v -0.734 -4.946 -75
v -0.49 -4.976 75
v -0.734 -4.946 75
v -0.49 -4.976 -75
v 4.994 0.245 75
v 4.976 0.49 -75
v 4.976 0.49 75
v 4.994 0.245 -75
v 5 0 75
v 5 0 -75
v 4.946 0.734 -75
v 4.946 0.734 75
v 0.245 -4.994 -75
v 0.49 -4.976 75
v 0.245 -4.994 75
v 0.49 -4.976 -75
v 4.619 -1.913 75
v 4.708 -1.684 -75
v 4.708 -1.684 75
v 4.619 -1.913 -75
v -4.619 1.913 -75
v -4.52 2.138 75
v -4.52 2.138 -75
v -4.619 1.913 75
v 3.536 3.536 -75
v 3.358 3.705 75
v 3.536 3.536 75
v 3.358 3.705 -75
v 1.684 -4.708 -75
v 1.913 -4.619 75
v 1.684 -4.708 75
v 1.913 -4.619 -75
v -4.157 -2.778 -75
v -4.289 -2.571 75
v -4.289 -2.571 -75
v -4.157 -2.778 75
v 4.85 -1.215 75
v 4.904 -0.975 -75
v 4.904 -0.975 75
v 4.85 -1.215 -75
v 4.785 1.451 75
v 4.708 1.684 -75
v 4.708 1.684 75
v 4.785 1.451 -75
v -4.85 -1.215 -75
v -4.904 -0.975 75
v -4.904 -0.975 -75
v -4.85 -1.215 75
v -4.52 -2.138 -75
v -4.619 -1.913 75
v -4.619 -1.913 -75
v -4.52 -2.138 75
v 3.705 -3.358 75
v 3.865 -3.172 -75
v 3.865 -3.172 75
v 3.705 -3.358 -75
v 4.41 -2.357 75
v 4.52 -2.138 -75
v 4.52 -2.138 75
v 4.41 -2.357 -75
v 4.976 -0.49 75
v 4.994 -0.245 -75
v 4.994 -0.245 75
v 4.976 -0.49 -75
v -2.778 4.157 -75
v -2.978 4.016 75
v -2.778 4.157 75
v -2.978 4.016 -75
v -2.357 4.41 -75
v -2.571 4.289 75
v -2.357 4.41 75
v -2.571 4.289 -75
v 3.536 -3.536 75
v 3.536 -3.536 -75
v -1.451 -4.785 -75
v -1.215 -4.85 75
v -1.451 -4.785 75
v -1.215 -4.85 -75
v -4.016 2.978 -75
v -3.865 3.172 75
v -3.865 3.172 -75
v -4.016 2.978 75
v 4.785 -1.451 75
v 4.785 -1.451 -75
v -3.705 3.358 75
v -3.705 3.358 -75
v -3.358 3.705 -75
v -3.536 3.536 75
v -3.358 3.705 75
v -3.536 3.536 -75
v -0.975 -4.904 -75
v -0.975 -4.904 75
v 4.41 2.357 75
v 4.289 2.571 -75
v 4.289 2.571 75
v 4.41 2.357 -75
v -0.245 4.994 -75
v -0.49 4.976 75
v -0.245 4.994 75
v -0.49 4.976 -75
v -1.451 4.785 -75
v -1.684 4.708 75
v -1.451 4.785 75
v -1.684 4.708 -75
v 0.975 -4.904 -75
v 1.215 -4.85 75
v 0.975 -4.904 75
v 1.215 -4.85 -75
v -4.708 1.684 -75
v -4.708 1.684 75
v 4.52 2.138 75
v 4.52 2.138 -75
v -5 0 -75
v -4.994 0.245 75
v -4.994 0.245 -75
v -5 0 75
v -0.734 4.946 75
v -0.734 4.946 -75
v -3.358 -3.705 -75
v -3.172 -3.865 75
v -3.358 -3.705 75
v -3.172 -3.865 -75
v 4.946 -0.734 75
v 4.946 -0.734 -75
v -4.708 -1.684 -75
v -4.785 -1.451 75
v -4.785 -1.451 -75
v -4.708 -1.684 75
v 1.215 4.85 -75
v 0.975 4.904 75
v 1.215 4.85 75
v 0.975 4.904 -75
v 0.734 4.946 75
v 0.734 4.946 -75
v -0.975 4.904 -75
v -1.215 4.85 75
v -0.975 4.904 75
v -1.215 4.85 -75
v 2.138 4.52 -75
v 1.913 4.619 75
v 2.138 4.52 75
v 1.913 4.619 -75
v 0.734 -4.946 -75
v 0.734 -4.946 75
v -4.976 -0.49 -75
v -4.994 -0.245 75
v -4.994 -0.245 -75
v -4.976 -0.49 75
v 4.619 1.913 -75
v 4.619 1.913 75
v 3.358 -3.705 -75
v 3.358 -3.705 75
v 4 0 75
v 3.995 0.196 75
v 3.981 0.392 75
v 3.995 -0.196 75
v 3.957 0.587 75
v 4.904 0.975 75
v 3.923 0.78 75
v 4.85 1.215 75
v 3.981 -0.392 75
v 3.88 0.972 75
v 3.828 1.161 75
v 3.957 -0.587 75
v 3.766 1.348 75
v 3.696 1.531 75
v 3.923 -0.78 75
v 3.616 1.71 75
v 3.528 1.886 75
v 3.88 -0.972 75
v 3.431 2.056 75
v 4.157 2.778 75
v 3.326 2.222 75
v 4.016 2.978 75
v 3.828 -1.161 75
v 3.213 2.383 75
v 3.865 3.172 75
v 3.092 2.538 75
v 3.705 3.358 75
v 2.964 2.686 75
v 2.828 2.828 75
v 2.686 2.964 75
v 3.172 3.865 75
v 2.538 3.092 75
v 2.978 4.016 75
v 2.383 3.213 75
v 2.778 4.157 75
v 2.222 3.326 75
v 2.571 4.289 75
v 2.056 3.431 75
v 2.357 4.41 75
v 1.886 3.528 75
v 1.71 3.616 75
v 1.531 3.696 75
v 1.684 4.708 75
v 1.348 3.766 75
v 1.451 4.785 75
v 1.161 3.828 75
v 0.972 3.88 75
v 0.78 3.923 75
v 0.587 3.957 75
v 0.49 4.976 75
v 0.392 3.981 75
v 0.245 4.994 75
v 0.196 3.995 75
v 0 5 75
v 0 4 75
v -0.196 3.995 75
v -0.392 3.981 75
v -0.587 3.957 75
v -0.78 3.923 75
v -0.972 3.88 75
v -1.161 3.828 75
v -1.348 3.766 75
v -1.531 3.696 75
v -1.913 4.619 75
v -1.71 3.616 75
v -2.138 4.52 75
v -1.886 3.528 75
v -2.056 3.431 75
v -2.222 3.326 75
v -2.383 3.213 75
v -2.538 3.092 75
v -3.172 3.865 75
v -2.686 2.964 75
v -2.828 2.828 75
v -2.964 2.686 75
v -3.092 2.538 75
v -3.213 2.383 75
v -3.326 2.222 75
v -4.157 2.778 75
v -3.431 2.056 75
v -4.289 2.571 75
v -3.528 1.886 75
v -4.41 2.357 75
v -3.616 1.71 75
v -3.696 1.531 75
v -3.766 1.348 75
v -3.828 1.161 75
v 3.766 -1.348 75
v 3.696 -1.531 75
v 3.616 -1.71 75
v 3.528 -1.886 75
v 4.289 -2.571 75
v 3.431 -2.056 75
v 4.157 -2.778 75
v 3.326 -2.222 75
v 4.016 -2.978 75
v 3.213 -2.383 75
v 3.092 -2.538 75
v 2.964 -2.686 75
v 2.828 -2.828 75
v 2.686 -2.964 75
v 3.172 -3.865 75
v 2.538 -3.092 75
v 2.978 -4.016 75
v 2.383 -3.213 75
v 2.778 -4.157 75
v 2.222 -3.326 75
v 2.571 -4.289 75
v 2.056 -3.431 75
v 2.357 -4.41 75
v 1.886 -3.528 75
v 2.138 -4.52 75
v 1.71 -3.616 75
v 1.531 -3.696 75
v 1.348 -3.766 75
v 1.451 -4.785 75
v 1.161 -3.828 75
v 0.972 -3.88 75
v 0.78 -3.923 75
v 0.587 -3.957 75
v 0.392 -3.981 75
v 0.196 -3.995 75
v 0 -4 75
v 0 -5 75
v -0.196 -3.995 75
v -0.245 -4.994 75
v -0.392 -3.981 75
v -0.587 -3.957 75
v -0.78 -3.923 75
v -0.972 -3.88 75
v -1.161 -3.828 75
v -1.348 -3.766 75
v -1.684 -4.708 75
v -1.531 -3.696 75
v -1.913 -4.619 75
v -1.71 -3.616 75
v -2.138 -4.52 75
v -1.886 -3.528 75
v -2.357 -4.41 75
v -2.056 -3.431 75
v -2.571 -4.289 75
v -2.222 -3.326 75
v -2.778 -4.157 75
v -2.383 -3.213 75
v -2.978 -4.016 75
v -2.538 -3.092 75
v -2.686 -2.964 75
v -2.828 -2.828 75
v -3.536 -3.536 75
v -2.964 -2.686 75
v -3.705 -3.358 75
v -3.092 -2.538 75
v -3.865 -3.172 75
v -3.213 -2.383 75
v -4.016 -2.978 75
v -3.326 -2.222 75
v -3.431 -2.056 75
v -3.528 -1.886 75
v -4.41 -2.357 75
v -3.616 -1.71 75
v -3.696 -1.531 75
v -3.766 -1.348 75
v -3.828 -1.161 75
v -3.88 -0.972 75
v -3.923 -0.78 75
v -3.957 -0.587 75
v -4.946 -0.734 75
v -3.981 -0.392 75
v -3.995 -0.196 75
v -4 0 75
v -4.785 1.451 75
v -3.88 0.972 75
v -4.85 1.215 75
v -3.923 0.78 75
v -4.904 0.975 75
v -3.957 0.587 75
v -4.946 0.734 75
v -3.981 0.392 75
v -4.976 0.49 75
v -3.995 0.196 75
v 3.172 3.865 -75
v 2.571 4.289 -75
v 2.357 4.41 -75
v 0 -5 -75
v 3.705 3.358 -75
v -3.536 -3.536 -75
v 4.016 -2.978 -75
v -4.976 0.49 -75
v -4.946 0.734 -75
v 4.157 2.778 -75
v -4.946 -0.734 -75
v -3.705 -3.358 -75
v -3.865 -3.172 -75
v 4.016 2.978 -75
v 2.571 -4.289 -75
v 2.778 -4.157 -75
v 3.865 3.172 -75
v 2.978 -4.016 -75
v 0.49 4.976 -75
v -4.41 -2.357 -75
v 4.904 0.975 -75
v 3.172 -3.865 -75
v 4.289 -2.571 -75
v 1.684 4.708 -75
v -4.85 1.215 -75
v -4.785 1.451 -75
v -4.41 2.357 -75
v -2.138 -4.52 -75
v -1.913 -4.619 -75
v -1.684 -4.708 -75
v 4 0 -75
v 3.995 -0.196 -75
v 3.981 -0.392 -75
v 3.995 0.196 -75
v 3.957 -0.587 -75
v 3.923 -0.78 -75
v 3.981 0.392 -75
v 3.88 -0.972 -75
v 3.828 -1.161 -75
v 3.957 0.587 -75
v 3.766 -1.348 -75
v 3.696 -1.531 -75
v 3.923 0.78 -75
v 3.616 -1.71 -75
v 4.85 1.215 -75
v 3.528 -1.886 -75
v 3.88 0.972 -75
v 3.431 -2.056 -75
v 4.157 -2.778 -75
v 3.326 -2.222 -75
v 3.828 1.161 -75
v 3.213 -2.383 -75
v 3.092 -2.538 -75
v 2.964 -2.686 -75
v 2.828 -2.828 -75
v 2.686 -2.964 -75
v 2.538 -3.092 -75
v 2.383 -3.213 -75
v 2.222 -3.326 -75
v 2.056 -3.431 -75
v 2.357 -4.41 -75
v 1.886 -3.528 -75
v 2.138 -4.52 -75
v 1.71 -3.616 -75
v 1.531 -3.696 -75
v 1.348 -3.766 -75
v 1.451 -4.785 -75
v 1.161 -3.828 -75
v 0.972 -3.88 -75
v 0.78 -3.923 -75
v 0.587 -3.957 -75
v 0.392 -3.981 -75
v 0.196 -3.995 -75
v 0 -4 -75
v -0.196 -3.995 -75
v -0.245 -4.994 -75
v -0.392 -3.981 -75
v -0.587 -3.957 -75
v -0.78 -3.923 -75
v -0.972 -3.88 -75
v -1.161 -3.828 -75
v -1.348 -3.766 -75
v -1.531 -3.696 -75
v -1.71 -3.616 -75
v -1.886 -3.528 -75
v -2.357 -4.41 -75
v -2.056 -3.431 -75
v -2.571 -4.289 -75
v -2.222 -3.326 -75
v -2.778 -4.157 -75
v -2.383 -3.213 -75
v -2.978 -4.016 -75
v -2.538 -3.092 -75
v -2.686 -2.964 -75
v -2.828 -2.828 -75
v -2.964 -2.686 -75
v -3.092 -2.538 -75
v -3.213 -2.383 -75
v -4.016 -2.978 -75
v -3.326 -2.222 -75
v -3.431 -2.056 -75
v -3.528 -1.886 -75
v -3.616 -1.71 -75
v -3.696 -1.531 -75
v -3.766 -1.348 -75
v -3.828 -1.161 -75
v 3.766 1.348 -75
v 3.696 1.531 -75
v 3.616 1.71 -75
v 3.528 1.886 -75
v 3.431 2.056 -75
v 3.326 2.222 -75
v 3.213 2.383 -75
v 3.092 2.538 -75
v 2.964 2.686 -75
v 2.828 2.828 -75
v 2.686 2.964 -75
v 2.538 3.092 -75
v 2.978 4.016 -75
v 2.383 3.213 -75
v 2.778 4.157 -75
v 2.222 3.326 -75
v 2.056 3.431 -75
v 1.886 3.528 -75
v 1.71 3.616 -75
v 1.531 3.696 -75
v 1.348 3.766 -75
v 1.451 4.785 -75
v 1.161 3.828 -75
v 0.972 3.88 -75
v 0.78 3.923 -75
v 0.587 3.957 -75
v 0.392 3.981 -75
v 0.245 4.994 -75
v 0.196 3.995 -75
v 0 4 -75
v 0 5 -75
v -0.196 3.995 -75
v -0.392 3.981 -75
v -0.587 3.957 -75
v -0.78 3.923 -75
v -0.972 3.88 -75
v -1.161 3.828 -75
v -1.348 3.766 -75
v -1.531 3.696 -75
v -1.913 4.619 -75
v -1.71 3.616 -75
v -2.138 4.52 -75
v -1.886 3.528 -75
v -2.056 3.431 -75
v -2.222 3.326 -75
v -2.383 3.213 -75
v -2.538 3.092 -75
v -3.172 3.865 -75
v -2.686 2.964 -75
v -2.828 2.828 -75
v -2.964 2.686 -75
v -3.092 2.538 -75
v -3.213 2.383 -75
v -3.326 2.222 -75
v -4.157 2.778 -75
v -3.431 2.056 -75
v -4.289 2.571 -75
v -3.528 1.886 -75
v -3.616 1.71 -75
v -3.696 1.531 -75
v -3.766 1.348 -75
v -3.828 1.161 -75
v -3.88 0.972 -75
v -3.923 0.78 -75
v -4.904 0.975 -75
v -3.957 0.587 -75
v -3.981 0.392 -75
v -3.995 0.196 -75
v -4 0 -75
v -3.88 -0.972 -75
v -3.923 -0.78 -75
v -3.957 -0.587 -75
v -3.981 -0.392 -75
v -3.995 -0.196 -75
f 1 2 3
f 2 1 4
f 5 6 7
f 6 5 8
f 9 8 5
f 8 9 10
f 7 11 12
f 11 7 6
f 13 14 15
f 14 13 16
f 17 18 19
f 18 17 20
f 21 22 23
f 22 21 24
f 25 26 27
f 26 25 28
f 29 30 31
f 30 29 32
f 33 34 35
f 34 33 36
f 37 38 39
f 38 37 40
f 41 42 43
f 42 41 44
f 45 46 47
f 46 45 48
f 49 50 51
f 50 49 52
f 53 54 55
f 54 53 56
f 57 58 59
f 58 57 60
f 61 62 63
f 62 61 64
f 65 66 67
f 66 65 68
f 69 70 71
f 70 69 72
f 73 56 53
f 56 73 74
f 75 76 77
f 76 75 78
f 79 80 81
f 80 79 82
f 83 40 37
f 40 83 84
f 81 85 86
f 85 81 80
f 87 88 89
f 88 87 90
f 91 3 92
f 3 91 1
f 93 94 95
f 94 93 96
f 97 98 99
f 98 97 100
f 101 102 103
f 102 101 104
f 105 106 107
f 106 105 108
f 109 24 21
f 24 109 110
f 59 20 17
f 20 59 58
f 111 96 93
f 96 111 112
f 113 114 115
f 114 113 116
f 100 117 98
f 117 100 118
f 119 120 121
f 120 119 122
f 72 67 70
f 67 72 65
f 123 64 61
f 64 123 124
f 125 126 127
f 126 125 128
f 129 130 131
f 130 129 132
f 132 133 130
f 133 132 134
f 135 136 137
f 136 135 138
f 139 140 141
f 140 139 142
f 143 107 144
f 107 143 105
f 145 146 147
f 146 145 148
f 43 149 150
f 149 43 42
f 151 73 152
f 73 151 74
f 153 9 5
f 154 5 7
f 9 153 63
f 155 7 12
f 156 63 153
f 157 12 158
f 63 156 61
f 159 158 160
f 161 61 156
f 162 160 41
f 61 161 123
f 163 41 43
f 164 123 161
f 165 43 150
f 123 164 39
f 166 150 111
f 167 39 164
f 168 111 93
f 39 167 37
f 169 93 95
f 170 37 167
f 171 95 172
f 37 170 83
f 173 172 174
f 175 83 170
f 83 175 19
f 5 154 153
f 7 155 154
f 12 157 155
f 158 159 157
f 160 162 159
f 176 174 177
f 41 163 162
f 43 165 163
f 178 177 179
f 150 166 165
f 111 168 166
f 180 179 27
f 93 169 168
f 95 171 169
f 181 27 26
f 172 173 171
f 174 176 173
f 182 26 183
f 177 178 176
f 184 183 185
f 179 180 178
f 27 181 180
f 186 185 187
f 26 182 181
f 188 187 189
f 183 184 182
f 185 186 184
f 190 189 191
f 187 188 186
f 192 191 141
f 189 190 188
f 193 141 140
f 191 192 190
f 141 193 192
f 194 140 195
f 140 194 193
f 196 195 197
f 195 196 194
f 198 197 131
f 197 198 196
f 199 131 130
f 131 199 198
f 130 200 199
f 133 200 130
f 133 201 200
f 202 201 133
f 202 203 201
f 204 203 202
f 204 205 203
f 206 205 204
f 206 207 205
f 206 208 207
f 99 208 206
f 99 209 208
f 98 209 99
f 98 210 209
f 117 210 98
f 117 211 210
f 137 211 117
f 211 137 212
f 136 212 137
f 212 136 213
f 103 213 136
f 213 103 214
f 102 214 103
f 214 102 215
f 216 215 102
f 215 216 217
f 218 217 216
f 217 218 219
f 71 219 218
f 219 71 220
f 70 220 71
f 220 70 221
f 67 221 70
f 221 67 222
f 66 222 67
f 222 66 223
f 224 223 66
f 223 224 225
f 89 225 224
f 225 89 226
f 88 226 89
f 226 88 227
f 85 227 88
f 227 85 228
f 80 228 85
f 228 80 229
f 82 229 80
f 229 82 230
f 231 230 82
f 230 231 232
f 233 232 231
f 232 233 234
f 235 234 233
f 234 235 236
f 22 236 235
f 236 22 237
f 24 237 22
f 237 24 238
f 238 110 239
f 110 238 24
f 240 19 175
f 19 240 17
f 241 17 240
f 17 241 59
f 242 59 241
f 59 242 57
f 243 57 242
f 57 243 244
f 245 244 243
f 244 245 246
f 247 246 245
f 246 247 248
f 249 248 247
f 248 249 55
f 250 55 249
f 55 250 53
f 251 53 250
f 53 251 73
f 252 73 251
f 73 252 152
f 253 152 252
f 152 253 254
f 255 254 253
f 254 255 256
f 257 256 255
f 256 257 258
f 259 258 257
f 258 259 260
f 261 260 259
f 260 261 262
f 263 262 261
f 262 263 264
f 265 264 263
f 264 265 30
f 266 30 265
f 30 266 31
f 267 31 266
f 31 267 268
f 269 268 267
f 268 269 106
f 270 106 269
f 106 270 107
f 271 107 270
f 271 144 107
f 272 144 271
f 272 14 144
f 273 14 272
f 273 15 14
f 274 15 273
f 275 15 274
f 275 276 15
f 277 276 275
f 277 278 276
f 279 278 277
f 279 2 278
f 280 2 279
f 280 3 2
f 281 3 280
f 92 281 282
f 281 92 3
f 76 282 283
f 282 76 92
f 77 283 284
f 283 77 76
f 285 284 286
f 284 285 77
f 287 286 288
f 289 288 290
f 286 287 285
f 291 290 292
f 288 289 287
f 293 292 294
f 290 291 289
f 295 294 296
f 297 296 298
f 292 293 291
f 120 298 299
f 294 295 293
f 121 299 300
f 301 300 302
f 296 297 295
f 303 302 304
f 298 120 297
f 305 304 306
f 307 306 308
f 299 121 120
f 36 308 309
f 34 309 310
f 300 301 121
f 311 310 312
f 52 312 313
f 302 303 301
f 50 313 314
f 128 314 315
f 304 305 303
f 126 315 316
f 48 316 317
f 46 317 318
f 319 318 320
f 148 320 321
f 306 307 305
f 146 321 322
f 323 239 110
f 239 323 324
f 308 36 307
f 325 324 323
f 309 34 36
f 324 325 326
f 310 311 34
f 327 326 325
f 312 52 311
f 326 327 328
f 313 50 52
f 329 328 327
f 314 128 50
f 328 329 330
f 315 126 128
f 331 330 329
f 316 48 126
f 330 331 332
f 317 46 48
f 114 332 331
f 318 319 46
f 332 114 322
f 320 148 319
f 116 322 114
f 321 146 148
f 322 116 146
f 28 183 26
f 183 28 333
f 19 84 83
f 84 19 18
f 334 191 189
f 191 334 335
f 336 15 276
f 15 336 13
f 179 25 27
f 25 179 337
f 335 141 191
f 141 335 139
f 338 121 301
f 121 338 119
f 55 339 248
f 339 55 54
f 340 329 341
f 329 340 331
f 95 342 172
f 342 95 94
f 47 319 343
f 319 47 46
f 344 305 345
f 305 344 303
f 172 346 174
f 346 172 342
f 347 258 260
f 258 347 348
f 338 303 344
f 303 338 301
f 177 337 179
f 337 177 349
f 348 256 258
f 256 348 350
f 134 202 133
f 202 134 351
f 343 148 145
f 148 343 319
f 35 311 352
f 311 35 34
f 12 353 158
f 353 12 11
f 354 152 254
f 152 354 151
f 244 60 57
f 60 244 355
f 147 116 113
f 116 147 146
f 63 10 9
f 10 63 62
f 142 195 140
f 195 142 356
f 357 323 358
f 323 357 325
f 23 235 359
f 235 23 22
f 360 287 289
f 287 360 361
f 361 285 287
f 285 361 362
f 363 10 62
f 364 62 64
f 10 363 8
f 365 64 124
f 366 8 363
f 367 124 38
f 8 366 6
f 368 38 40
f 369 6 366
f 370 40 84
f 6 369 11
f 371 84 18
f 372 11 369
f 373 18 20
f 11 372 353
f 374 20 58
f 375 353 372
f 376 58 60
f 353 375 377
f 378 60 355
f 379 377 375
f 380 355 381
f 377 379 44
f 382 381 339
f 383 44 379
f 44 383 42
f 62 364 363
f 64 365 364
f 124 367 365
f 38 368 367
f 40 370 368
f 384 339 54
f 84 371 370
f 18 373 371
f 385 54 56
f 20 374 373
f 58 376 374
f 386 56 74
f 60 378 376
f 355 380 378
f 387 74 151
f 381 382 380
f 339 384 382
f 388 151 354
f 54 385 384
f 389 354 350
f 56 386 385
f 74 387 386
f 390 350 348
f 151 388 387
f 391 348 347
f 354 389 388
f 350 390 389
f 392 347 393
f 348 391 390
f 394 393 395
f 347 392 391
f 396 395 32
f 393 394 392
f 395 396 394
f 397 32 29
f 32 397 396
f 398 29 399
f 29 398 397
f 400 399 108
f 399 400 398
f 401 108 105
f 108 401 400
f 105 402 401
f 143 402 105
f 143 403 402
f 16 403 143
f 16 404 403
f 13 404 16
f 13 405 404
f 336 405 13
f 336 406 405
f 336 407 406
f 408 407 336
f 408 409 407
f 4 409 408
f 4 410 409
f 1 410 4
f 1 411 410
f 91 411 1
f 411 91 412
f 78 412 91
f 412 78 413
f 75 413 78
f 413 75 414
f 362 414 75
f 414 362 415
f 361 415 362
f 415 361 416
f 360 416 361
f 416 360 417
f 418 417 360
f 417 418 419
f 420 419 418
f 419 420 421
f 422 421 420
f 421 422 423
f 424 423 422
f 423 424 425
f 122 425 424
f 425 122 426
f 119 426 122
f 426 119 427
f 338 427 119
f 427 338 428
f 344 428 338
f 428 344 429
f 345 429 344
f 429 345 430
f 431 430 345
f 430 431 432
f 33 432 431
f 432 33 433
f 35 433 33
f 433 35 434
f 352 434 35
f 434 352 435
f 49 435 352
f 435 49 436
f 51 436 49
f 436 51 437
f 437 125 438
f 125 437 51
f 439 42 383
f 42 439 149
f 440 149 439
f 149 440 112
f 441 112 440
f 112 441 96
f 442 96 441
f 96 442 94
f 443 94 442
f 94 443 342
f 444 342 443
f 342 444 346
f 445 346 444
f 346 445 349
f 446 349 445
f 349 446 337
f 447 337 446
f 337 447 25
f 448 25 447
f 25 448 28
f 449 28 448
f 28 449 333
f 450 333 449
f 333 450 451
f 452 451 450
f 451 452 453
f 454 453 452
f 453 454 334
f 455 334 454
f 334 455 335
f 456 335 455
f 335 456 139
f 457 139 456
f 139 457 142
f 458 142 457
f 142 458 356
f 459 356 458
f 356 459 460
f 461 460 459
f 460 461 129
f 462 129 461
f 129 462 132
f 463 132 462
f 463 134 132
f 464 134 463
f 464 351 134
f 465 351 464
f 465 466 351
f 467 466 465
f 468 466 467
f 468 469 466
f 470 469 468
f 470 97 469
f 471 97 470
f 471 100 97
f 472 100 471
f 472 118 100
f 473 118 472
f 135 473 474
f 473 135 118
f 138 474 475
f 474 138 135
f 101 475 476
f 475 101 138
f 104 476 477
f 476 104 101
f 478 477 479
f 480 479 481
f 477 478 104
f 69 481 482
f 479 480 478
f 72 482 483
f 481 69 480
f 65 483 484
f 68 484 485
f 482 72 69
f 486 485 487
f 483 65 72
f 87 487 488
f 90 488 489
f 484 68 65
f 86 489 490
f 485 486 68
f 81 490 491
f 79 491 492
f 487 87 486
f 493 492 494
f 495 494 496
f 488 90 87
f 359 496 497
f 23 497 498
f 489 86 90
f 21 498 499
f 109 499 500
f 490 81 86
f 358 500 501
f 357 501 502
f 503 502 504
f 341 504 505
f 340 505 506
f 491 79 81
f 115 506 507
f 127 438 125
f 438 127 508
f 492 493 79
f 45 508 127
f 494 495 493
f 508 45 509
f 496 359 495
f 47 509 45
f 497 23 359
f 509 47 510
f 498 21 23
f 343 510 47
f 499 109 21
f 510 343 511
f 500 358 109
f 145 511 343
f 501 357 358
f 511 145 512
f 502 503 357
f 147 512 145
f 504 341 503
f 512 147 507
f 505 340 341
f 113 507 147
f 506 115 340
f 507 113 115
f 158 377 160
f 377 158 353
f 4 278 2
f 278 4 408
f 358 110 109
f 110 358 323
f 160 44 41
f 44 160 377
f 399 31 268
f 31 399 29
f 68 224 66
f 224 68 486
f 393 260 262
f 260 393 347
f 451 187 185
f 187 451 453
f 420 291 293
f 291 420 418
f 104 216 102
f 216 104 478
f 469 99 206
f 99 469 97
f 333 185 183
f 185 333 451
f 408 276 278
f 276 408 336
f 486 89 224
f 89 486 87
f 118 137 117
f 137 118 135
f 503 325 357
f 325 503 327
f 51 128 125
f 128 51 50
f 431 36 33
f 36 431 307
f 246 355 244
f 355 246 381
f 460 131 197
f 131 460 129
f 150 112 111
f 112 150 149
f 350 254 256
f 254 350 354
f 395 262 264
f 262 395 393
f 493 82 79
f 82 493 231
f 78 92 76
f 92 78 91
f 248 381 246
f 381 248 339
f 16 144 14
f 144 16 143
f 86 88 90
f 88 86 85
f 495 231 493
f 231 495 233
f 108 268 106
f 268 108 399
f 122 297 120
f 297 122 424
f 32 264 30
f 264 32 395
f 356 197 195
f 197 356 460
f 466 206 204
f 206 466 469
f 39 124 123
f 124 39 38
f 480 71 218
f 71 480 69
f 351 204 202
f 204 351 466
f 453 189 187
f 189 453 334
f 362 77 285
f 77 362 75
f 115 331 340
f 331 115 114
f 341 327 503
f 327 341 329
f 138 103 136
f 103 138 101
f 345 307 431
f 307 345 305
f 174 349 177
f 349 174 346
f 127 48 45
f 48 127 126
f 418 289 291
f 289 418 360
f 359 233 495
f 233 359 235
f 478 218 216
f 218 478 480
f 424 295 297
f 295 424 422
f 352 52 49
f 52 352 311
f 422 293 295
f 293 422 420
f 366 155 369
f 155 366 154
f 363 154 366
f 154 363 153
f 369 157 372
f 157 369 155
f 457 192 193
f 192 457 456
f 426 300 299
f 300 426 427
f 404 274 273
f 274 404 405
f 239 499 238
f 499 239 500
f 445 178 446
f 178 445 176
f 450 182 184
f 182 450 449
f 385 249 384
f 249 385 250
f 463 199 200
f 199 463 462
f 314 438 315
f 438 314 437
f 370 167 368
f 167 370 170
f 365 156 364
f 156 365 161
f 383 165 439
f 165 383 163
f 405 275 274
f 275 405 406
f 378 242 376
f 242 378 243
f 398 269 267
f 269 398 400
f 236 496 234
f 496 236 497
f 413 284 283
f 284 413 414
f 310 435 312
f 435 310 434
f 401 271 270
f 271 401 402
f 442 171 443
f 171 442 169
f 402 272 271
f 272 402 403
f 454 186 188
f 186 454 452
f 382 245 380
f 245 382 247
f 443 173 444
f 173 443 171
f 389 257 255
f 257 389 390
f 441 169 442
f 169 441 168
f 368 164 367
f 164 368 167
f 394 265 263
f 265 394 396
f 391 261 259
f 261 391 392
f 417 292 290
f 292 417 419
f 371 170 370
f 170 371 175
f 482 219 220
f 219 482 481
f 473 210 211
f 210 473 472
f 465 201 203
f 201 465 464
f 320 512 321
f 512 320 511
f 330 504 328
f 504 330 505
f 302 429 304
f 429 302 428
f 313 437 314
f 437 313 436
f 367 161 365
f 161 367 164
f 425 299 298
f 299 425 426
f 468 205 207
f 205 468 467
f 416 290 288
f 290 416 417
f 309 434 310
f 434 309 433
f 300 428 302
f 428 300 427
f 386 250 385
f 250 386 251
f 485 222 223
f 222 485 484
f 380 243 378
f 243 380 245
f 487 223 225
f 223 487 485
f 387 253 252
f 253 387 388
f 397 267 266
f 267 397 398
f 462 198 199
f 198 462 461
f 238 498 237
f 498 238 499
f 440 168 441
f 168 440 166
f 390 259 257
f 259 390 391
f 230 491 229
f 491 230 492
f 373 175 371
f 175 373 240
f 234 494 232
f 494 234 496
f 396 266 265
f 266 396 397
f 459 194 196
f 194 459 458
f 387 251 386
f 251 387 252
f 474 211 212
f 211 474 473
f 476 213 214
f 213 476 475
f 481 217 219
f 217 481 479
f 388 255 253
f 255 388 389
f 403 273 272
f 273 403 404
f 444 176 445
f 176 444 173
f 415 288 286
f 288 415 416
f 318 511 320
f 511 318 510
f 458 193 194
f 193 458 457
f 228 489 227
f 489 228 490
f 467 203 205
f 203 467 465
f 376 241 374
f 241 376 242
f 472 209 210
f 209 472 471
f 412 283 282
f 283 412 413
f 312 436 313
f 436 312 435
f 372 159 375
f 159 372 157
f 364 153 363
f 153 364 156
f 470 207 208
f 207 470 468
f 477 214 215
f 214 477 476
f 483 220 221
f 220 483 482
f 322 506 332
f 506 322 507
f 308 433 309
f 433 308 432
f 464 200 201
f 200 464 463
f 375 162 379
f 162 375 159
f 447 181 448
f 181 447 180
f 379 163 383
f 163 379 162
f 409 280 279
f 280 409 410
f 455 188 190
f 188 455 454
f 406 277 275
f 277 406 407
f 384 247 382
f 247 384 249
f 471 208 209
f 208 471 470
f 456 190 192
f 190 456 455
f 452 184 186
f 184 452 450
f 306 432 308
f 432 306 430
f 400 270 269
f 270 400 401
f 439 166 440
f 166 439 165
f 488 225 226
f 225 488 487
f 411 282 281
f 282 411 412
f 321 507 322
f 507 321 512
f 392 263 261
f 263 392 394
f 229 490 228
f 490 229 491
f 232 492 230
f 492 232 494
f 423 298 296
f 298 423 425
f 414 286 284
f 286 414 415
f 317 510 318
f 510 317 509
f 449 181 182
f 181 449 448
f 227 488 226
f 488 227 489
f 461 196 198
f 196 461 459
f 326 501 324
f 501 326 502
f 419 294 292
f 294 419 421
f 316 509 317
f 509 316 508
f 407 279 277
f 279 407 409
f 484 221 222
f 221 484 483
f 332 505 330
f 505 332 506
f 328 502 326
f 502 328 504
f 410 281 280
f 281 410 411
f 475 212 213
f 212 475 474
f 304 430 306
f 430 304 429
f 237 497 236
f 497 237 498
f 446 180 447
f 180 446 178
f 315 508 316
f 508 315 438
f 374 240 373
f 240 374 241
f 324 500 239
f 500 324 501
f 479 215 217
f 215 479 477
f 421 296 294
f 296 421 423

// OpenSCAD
// PTFE sleeving / tubing (hollow cylinder) - single connected solid

module tubing(tubing_type="standard", length=100, forced_internal_diameter=undef, center=false) {

    // Dimensions by type
    outer_diameter =
        (tubing_type == "thin")  ? 8  :
        (tubing_type == "thick") ? 12 : 10;

    wall_thickness =
        (tubing_type == "thin")  ? 0.5 :
        (tubing_type == "thick") ? 1.5 : 1;

    // Derived inner diameter (clamped to avoid invalid/blank geometry)
    inner_from_wall = outer_diameter - 2*wall_thickness;
    internal_diameter_raw = (forced_internal_diameter == undef) ? inner_from_wall : forced_internal_diameter;

    // Ensure inner diameter is positive and smaller than outer diameter
    eps = 0.02;
    internal_diameter = min(max(internal_diameter_raw, eps), outer_diameter - eps);

    // Make a true hollow sleeve using difference (one connected solid)
    difference() {
        cylinder(d=outer_diameter, h=length, center=center, $fn=128);

        // Slightly longer inner cut to guarantee through-hole regardless of centering
        cylinder(d=internal_diameter, h=length + 2*eps, center=center, $fn=128);
    }
}

// Example usage
tubing(tubing_type="standard", length=150, center=true);
